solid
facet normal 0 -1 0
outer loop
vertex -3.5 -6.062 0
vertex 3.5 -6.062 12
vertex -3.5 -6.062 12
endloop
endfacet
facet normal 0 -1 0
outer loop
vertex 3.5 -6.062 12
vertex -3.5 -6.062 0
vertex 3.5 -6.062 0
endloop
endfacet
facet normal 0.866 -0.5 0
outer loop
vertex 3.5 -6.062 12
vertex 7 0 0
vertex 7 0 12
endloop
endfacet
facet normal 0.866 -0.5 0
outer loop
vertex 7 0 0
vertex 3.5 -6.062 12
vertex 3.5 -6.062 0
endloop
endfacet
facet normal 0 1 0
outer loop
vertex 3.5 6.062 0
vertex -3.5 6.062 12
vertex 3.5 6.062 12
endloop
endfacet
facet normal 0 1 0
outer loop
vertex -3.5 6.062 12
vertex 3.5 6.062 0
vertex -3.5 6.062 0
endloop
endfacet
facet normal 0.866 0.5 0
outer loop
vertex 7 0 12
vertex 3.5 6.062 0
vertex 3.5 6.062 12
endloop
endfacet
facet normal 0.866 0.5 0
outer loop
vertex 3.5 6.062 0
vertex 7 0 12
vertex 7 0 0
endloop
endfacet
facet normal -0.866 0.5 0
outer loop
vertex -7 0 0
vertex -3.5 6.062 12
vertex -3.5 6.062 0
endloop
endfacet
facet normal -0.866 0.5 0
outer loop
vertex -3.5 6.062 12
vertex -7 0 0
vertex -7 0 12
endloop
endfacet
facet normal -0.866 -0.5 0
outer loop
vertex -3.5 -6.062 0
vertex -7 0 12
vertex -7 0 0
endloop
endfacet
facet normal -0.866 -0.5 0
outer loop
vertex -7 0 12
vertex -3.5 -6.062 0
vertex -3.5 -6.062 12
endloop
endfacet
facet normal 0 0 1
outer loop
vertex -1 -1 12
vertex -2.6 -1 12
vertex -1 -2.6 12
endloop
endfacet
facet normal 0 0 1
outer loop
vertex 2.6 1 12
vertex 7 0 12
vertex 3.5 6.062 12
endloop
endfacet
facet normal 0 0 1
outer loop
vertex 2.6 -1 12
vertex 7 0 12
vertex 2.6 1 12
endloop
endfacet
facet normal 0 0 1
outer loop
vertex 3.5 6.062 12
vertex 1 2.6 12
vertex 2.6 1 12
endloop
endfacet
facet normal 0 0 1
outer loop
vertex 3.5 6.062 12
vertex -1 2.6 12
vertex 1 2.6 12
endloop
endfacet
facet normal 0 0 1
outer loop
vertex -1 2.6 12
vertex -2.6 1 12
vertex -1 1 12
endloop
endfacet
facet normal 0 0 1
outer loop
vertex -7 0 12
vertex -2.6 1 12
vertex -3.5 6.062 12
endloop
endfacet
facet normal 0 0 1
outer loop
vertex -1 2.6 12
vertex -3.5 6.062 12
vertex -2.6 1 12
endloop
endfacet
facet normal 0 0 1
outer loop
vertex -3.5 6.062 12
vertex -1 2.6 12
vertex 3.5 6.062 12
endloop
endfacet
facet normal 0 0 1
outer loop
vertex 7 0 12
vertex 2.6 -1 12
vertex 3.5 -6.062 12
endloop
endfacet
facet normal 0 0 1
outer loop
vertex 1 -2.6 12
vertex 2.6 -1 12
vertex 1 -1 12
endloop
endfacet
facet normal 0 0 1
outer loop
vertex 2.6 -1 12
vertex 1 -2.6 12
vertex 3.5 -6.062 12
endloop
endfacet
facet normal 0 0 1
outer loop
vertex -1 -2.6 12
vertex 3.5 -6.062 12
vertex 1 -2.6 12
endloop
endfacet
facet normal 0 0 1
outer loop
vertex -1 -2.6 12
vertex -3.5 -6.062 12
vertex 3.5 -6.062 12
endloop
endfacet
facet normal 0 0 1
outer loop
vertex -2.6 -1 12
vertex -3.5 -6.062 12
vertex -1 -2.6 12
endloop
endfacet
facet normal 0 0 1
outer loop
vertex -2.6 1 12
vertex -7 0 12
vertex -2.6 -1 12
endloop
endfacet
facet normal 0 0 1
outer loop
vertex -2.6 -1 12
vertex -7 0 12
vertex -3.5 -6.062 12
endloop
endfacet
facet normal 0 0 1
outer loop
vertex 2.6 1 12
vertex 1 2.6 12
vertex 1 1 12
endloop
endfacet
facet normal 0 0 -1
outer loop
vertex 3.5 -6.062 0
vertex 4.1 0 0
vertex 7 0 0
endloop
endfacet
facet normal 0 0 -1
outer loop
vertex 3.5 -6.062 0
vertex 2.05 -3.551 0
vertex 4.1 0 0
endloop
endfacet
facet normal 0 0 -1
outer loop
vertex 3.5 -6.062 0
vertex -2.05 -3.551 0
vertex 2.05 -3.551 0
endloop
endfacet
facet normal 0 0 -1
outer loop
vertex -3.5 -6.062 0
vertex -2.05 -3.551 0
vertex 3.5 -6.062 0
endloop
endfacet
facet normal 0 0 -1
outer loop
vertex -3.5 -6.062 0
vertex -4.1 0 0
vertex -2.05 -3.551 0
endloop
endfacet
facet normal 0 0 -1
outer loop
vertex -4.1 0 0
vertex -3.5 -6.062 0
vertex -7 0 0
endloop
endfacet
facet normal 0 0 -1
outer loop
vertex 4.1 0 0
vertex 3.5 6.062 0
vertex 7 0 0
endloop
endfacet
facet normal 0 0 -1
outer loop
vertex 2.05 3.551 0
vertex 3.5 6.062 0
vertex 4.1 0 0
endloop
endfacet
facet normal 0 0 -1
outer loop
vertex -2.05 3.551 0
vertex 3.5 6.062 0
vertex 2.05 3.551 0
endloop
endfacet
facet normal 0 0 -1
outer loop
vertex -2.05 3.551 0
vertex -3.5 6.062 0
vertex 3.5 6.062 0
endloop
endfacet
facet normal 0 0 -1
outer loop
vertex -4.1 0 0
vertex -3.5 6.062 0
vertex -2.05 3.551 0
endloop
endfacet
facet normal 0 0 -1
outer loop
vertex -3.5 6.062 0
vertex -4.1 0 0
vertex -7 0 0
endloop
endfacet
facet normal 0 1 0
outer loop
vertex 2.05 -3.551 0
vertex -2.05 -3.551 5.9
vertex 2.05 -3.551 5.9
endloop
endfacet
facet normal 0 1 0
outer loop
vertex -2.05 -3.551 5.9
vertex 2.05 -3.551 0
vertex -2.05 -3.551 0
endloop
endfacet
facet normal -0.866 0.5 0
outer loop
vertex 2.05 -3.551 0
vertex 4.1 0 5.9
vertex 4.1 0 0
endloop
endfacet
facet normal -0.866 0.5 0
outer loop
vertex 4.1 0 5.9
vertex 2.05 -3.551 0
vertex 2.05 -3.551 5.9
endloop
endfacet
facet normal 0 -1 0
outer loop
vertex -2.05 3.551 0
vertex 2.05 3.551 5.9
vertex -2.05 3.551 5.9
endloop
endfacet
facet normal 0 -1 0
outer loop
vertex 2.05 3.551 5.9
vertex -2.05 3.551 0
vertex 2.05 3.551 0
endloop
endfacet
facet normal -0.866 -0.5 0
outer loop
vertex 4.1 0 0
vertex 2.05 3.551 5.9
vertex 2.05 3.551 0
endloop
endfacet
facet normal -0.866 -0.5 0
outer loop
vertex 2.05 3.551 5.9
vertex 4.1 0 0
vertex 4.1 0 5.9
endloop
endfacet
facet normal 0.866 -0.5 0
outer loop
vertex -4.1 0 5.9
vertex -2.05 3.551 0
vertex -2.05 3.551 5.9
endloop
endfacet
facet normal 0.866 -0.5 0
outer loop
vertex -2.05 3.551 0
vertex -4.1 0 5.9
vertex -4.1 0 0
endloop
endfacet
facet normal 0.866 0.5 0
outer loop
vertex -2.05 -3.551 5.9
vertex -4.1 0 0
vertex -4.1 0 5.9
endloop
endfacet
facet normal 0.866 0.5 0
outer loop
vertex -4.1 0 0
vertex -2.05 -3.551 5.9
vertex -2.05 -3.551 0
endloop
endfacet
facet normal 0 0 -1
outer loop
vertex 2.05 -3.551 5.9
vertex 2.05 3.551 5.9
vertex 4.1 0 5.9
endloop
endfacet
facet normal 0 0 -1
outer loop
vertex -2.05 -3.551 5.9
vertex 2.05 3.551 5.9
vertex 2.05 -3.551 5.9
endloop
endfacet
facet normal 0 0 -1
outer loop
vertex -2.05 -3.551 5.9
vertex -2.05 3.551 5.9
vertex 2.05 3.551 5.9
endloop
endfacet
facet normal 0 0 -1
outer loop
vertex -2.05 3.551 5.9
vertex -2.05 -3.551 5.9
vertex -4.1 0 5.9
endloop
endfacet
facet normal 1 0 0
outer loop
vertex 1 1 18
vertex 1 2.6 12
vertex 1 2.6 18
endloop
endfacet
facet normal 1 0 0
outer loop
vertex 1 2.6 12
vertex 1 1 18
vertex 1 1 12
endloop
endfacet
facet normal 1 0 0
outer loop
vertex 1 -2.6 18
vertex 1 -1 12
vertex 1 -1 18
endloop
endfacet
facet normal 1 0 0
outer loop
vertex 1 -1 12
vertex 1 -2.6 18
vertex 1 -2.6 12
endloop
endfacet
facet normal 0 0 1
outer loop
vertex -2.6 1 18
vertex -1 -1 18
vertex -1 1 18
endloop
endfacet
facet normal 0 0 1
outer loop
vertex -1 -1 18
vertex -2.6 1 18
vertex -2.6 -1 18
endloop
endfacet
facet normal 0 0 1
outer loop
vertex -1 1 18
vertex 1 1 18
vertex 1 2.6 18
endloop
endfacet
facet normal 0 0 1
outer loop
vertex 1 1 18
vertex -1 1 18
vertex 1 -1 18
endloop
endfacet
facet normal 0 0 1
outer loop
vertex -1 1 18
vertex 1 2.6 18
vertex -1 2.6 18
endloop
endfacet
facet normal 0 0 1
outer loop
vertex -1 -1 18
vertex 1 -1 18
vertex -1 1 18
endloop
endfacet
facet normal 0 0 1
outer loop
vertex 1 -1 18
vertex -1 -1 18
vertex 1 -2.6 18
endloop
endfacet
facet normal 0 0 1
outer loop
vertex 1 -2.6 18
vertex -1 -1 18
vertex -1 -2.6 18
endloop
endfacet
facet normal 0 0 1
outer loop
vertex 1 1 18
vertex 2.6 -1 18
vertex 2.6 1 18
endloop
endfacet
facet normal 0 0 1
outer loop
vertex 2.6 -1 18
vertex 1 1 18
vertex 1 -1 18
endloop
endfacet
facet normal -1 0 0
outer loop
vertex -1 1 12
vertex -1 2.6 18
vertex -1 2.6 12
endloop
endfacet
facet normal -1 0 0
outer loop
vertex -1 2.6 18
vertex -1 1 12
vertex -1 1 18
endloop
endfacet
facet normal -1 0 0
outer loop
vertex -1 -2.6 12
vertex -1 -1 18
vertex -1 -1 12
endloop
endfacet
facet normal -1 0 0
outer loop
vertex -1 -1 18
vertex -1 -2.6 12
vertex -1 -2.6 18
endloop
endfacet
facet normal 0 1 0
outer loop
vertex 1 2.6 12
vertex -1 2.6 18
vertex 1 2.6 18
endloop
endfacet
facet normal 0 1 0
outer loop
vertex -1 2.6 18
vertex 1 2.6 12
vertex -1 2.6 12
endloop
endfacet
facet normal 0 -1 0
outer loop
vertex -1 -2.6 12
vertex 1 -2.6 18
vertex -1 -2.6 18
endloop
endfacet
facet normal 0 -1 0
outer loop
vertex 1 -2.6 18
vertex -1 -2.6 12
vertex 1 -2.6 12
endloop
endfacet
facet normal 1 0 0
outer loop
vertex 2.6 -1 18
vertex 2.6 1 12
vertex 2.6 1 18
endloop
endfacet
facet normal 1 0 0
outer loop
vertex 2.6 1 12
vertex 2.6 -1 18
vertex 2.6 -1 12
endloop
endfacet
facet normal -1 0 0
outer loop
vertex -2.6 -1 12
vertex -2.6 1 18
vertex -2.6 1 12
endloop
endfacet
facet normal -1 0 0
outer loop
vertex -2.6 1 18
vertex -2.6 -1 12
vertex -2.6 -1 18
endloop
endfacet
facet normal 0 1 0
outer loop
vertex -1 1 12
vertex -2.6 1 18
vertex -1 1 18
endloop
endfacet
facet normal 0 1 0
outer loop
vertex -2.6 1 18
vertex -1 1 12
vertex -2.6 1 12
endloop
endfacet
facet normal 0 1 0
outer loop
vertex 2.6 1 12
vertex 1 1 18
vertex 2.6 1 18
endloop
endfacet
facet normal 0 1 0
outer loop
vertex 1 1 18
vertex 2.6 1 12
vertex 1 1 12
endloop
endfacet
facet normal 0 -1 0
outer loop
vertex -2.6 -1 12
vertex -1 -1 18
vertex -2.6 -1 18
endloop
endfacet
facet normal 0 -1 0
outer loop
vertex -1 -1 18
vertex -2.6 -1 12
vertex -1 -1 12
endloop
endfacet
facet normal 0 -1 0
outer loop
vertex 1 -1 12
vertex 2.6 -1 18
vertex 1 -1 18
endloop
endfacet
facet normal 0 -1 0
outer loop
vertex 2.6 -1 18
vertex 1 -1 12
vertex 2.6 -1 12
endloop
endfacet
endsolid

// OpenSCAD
difference() {
    cylinder(d = 14, h = 12, $fn = 6);
    translate([0, 0, -0.1]) cylinder(d = 8.2, h = 6, $fn = 6);
}

translate([0, 0, 14]) {
    cube([2, 5.2, 8], true);
    cube([5.2, 2, 8], true);
}
